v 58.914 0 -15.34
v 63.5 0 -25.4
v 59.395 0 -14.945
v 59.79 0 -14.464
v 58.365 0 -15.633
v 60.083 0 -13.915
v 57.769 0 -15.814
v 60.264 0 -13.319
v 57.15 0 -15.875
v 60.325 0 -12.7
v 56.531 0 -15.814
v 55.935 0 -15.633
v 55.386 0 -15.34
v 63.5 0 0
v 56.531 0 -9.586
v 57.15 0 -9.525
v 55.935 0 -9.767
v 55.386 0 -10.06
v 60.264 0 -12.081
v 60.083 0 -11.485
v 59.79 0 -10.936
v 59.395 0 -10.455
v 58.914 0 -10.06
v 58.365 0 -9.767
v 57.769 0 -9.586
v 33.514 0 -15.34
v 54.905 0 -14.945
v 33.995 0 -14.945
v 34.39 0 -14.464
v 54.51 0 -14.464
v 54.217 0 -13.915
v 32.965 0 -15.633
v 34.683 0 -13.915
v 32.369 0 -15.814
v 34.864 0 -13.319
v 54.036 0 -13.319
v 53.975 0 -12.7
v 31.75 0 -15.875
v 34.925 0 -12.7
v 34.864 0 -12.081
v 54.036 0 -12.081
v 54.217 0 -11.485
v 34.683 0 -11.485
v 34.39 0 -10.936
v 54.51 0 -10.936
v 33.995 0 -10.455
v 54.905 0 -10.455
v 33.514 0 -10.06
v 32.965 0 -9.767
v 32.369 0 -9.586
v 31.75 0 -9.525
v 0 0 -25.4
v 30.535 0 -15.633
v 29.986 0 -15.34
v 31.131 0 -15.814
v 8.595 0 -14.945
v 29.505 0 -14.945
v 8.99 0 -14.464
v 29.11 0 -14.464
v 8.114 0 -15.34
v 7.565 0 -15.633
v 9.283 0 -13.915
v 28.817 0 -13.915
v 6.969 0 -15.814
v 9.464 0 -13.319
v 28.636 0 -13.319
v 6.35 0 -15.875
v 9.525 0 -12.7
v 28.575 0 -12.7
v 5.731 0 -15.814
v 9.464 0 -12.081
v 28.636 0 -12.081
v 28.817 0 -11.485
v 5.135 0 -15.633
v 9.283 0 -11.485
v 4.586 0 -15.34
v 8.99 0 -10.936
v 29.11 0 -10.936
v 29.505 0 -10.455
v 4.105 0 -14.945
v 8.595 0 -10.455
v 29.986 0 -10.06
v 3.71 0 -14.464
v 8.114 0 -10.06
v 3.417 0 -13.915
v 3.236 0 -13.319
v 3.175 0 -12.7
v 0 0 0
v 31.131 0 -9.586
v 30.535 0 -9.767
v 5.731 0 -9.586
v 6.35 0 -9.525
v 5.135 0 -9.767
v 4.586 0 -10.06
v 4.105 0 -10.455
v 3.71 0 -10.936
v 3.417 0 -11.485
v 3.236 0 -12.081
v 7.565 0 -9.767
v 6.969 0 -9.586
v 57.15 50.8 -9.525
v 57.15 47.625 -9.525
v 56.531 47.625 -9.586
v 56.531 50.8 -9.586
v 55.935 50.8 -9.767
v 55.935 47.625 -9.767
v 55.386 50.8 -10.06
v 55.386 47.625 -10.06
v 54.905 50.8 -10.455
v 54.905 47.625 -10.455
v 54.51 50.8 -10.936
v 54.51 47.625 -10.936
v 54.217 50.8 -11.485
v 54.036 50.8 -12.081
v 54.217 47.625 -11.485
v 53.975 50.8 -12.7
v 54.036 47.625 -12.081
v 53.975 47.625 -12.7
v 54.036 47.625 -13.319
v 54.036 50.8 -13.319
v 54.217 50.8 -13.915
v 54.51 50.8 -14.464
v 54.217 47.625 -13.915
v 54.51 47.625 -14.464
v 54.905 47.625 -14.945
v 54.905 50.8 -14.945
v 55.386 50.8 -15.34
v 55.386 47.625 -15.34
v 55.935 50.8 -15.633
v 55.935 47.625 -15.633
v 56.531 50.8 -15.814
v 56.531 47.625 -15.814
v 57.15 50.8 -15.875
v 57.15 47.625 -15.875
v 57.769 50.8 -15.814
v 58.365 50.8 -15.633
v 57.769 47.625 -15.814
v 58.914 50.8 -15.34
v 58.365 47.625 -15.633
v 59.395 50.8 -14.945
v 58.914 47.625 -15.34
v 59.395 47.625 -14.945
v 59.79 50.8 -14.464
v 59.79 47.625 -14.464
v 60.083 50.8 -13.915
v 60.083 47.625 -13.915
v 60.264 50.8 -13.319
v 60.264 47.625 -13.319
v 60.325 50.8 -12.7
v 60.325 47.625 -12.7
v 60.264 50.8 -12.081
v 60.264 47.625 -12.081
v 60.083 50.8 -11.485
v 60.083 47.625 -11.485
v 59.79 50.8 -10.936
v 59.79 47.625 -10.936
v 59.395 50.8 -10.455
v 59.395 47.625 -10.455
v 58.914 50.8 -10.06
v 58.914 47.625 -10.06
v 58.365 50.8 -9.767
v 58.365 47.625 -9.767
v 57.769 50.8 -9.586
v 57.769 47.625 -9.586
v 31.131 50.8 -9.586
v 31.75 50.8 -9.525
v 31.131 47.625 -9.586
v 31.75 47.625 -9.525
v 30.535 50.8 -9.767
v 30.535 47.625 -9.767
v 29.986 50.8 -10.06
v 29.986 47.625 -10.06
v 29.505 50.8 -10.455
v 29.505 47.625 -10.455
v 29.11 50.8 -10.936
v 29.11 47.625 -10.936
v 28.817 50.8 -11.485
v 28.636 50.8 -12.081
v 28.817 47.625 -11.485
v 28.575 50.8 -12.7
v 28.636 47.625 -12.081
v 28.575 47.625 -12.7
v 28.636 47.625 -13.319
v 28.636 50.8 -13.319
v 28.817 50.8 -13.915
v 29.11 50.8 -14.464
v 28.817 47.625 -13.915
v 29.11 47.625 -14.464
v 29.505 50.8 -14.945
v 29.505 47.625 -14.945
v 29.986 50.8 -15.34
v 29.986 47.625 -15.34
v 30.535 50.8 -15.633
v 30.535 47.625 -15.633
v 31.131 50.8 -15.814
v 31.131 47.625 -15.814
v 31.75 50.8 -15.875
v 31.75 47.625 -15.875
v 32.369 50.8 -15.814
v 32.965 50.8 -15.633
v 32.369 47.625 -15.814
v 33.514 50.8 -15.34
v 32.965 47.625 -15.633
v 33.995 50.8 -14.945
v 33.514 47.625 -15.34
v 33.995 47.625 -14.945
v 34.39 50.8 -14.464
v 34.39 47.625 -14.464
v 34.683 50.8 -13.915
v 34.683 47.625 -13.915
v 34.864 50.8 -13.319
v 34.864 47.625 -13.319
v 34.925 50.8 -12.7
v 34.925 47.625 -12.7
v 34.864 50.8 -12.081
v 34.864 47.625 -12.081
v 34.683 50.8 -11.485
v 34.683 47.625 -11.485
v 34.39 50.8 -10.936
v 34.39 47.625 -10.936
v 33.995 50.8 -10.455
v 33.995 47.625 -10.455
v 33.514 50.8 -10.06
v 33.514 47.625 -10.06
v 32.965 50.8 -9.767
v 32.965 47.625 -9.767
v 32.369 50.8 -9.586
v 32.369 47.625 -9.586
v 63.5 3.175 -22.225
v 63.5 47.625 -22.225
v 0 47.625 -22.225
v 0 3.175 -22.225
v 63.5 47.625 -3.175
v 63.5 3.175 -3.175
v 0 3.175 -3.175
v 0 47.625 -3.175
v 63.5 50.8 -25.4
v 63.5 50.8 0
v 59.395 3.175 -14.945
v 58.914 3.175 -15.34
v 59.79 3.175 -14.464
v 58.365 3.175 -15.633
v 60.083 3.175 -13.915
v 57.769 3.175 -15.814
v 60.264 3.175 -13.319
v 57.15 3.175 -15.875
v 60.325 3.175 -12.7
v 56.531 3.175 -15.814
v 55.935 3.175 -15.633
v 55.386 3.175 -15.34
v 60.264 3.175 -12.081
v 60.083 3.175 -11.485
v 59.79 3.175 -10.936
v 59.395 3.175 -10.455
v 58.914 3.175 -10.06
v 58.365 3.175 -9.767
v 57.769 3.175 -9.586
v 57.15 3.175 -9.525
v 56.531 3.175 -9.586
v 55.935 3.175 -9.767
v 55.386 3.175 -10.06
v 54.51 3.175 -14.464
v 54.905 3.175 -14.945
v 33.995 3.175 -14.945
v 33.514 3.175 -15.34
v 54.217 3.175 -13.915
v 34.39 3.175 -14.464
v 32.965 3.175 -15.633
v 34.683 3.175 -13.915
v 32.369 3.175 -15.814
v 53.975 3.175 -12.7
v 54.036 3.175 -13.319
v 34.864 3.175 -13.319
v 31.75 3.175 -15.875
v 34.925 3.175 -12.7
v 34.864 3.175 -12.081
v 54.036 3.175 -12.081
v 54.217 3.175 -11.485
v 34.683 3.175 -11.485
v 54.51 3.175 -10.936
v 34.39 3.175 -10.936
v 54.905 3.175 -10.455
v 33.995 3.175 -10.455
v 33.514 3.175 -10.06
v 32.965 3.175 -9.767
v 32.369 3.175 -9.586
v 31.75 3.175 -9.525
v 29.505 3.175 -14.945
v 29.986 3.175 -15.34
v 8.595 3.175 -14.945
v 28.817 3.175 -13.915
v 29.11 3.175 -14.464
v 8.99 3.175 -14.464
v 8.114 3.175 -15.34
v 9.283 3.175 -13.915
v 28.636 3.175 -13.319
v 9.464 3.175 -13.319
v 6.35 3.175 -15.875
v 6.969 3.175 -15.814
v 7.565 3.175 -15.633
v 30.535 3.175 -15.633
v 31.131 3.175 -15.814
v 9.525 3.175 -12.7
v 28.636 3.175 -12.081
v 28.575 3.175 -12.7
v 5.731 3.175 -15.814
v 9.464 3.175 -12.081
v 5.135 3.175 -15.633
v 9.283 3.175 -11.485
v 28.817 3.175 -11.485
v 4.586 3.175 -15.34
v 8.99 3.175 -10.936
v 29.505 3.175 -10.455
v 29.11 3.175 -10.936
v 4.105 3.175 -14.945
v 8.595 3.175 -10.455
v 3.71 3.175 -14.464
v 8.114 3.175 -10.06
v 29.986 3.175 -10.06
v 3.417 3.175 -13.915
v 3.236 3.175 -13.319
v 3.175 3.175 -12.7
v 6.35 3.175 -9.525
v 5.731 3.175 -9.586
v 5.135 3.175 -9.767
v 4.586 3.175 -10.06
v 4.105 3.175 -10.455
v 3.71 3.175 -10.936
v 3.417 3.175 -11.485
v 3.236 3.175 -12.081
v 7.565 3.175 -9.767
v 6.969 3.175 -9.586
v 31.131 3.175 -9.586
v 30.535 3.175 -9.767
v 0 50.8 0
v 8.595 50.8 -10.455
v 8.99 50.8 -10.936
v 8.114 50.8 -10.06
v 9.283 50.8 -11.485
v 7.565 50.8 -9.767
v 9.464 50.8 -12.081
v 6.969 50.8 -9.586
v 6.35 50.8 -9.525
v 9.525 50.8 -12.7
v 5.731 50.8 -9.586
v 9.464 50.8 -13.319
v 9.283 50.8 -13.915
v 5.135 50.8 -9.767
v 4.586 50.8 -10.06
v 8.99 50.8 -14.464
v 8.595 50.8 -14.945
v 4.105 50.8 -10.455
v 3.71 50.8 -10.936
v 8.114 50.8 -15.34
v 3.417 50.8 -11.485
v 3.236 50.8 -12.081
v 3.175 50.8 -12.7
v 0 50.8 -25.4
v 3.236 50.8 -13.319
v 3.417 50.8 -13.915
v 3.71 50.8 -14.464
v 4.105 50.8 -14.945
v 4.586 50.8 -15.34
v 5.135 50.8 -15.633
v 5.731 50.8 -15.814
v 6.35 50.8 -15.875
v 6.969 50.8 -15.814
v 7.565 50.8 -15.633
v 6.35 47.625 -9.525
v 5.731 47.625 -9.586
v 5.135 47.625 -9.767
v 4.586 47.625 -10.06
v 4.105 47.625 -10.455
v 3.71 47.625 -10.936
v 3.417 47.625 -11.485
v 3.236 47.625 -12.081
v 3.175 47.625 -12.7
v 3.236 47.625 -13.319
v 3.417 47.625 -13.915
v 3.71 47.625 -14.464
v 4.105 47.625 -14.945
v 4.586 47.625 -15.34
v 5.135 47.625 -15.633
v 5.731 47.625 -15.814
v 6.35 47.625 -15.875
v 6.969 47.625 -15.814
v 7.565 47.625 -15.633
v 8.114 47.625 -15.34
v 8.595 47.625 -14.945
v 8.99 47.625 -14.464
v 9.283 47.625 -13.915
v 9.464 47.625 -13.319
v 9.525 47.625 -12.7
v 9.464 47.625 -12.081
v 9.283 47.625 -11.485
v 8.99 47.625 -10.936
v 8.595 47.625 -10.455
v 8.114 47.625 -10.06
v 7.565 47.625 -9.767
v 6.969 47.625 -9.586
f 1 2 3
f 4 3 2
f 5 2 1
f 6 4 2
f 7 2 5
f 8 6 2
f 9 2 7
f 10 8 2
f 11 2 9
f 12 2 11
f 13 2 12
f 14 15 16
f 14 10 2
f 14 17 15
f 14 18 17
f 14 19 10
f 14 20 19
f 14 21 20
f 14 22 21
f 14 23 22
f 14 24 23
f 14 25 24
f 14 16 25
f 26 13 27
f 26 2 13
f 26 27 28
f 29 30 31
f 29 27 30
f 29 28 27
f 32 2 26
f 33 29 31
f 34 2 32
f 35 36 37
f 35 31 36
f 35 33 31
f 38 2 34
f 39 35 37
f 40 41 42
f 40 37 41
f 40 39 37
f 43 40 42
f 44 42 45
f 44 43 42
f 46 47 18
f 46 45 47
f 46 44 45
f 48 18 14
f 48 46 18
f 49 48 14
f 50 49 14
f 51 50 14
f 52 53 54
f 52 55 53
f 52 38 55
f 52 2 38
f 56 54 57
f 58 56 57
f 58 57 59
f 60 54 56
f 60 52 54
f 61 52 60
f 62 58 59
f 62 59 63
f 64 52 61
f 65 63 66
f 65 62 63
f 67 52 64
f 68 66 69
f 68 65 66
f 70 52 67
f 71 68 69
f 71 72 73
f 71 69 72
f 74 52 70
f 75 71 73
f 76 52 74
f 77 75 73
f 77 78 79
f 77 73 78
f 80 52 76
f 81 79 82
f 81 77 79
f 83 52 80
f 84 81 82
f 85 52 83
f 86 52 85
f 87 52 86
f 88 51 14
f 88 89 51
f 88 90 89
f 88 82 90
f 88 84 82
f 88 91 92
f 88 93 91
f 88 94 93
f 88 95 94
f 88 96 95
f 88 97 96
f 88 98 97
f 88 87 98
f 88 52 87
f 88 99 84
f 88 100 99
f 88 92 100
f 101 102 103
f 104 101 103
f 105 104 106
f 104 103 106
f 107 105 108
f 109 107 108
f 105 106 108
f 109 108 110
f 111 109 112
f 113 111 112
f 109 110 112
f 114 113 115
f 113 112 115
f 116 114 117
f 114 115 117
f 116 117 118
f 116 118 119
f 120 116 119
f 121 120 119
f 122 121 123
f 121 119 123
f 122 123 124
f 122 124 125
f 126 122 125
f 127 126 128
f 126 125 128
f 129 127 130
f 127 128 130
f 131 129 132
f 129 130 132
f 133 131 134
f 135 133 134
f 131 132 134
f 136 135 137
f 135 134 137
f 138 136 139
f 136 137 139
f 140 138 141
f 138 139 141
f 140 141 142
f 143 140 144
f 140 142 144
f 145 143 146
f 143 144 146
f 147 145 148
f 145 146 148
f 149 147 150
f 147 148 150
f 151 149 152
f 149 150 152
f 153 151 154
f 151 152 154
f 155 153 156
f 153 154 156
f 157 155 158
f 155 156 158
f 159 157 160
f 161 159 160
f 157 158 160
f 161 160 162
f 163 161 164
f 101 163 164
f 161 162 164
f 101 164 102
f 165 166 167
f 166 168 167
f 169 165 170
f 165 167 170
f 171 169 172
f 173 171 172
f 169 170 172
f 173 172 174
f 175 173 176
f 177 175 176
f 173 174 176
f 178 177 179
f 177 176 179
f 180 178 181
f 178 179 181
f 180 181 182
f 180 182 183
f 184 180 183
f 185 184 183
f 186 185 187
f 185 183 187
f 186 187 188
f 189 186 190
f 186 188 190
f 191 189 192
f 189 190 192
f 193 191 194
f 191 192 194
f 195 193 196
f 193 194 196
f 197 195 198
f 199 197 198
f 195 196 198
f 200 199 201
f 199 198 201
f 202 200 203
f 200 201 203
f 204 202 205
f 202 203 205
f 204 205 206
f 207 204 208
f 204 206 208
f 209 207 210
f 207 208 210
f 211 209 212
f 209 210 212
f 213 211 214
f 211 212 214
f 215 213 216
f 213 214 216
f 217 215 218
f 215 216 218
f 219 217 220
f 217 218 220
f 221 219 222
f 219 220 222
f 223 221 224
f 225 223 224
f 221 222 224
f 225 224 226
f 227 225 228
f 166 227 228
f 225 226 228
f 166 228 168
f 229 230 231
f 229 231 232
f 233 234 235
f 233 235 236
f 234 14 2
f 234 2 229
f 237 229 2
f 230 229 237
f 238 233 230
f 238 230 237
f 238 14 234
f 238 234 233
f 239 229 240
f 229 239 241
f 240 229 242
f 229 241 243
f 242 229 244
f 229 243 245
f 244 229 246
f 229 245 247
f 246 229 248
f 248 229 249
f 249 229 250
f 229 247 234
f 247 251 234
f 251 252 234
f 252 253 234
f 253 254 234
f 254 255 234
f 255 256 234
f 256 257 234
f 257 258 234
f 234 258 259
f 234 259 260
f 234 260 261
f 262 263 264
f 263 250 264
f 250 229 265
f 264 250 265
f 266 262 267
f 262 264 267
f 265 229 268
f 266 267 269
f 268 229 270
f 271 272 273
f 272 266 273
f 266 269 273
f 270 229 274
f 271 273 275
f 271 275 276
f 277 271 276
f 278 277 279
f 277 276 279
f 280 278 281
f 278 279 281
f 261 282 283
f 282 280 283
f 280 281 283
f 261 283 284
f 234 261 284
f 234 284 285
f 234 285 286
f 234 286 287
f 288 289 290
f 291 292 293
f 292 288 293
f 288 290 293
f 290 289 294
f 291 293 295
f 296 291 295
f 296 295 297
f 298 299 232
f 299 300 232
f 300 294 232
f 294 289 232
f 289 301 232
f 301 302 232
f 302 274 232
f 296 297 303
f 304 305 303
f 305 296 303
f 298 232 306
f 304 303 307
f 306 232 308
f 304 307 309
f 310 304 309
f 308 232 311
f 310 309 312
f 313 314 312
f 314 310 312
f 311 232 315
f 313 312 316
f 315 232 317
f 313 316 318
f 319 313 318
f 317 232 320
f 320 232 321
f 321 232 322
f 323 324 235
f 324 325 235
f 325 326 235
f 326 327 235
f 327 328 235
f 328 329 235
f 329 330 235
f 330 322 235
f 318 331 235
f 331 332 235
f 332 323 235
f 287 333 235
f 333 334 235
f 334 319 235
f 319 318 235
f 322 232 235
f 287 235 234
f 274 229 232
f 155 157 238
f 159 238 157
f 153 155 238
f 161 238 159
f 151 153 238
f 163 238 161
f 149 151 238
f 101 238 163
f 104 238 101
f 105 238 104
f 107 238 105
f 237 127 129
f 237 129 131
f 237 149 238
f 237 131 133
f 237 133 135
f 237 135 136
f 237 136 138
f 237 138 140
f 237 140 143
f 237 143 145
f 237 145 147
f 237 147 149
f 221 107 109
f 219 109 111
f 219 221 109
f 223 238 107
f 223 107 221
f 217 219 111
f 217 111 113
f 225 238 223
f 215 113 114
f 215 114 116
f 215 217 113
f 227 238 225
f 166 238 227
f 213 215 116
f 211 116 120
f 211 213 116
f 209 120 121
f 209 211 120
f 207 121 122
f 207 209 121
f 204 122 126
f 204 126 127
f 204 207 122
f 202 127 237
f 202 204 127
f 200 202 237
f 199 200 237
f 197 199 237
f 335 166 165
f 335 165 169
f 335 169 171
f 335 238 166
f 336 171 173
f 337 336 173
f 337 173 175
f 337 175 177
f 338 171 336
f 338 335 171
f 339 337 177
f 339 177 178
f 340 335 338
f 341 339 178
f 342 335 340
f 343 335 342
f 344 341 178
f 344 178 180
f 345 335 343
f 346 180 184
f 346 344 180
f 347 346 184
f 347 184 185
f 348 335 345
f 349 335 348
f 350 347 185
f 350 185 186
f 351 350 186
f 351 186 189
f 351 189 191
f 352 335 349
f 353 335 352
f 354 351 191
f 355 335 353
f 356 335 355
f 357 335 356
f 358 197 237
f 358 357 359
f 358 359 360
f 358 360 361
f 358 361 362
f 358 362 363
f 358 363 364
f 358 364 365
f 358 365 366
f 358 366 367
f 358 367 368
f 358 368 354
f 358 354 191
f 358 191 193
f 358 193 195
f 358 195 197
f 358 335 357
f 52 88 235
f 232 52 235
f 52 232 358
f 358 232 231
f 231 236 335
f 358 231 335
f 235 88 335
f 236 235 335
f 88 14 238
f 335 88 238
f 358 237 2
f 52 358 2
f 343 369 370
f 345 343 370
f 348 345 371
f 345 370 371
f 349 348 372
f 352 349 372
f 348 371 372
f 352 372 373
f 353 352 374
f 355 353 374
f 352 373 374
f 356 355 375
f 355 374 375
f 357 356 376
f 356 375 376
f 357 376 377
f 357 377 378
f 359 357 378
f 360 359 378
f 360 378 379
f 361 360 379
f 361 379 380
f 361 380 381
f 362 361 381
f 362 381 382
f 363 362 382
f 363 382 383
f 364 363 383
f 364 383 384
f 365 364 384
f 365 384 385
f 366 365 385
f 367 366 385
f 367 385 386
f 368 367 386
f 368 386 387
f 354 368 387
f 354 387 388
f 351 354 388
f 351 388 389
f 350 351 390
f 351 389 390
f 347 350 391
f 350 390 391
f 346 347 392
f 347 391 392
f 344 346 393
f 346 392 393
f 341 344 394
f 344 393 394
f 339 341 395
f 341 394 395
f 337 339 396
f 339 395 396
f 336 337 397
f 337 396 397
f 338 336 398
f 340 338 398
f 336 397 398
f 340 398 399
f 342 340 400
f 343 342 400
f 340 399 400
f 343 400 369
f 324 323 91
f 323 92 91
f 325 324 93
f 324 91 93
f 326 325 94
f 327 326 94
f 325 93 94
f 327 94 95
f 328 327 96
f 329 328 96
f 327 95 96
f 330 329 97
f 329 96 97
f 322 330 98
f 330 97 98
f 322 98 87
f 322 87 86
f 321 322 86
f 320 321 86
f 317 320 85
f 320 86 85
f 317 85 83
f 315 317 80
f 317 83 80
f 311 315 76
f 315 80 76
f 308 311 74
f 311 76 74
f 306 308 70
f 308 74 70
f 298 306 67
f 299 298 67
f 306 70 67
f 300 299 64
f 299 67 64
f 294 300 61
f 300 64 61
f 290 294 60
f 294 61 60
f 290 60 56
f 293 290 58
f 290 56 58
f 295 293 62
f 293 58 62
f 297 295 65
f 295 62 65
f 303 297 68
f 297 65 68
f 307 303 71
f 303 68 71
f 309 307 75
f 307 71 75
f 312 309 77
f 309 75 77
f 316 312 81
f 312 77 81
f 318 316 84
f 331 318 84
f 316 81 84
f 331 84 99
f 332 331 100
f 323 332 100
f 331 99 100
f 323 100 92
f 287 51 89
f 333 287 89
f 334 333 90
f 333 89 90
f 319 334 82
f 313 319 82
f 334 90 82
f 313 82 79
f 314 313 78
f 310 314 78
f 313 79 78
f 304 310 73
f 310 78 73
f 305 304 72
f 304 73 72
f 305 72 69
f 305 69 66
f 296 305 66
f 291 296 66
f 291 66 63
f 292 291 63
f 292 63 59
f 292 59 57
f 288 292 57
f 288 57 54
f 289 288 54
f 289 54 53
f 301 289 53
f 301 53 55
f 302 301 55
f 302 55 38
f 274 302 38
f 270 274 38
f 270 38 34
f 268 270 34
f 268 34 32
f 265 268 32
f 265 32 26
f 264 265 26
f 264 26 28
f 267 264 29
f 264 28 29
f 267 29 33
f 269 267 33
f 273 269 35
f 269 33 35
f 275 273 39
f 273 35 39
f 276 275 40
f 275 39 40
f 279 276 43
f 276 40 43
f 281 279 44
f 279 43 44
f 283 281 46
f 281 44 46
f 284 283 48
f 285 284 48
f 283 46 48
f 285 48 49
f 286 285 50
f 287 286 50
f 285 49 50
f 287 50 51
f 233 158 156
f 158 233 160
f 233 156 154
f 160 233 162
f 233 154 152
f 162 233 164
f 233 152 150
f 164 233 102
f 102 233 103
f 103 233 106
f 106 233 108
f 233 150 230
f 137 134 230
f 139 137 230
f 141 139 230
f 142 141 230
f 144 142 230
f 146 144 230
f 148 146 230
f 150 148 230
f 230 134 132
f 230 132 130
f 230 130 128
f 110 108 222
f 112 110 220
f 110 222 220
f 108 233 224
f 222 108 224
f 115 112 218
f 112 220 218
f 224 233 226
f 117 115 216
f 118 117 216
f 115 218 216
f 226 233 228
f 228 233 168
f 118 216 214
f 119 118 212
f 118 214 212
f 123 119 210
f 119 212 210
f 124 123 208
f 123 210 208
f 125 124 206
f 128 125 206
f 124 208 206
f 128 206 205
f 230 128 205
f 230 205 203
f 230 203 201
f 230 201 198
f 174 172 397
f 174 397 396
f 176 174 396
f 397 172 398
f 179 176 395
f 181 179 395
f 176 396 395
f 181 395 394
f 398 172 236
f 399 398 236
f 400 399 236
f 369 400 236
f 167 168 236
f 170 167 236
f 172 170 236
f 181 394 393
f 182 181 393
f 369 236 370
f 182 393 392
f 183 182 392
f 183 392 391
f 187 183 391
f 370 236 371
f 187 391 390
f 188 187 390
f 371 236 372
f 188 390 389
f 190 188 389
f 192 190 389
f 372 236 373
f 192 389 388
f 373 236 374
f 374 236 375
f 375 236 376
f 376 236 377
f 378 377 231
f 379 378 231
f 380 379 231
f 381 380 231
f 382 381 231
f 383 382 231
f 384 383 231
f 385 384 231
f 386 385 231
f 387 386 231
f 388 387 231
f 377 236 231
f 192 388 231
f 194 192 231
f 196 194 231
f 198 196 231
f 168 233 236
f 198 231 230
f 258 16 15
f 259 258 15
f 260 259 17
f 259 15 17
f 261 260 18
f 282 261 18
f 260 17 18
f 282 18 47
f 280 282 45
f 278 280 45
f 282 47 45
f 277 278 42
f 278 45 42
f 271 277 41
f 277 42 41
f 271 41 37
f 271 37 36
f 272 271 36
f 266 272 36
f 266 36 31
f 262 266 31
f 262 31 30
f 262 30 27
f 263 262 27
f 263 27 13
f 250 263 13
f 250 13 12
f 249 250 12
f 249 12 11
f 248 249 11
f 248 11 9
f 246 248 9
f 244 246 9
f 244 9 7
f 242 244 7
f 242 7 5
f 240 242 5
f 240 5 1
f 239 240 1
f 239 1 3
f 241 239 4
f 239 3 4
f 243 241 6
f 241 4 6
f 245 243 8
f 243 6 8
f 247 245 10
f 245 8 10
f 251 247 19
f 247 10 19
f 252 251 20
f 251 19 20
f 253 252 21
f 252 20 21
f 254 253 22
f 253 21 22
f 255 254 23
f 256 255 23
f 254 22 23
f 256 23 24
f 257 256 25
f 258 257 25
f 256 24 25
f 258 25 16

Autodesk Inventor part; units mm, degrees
ref_plane "YZ Plane" through (0, 0, 0) normal (1, 0, 0) x (0, 1, 0)
ref_plane "XZ Plane" through (0, 0, 0) normal (0, 1, 0) x (-1, 0, 0)
ref_plane "XY Plane" through (0, 0, 0) normal (0, 0, 1) x (1, 0, 0)
sketch "Sketch1" plane through (0, 0, 0) normal (1, 0, 0) x (0, 1, 0)
  line L0 (0, 0) -> (50.8, 0)
  line L1 (50.8, 0) -> (50.8, -25.4)
  line L2 (50.8, -25.4) -> (0, -25.4)
  line L3 (0, -25.4) -> (0, 0)
  line L4 (3.175, -3.175) -> (47.625, -3.175)
  line L5 (47.625, -3.175) -> (47.625, -22.225)
  line L6 (47.625, -22.225) -> (3.175, -22.225)
  line L7 (3.175, -22.225) -> (3.175, -3.175)
  dimension "d0" = 50.8
  dimension "d1" = 25.4
  dimension "d2" = 44.45
  dimension "d3" = 19.05
  dimension "d4" = 3.175
  dimension "d5" = 3.175
extrude "Extrusion1" add sketch "Sketch1" along normal blind 63.5
sketch "Sketch2" plane through (0, 50.8, 0) normal (0, 1, 0) x (1, 0, 0)
  line L0 (0, 0) -> (63.5, 0) projected
  line L1 (63.5, 25.4) -> (63.5, 0) projected
  point P0 (57.15, 12.7)
  point P1 (31.75, 12.7)
  point P2 (6.35, 12.7)
  dimension "d8" = 6.35
  dimension "d9" = 31.75
  dimension "d10" = 57.15
  dimension "d11" = 12.7
  dimension "d12" = 12.7
  dimension "d13" = 12.7
hole "Hole1" at (57.15, 50.8, -12.7) at (31.75, 50.8, -12.7) at (6.35, 50.8, -12.7) direction (0, -1, 0) diameter 6.35 end through all
properties part number "back roller 2x1"
